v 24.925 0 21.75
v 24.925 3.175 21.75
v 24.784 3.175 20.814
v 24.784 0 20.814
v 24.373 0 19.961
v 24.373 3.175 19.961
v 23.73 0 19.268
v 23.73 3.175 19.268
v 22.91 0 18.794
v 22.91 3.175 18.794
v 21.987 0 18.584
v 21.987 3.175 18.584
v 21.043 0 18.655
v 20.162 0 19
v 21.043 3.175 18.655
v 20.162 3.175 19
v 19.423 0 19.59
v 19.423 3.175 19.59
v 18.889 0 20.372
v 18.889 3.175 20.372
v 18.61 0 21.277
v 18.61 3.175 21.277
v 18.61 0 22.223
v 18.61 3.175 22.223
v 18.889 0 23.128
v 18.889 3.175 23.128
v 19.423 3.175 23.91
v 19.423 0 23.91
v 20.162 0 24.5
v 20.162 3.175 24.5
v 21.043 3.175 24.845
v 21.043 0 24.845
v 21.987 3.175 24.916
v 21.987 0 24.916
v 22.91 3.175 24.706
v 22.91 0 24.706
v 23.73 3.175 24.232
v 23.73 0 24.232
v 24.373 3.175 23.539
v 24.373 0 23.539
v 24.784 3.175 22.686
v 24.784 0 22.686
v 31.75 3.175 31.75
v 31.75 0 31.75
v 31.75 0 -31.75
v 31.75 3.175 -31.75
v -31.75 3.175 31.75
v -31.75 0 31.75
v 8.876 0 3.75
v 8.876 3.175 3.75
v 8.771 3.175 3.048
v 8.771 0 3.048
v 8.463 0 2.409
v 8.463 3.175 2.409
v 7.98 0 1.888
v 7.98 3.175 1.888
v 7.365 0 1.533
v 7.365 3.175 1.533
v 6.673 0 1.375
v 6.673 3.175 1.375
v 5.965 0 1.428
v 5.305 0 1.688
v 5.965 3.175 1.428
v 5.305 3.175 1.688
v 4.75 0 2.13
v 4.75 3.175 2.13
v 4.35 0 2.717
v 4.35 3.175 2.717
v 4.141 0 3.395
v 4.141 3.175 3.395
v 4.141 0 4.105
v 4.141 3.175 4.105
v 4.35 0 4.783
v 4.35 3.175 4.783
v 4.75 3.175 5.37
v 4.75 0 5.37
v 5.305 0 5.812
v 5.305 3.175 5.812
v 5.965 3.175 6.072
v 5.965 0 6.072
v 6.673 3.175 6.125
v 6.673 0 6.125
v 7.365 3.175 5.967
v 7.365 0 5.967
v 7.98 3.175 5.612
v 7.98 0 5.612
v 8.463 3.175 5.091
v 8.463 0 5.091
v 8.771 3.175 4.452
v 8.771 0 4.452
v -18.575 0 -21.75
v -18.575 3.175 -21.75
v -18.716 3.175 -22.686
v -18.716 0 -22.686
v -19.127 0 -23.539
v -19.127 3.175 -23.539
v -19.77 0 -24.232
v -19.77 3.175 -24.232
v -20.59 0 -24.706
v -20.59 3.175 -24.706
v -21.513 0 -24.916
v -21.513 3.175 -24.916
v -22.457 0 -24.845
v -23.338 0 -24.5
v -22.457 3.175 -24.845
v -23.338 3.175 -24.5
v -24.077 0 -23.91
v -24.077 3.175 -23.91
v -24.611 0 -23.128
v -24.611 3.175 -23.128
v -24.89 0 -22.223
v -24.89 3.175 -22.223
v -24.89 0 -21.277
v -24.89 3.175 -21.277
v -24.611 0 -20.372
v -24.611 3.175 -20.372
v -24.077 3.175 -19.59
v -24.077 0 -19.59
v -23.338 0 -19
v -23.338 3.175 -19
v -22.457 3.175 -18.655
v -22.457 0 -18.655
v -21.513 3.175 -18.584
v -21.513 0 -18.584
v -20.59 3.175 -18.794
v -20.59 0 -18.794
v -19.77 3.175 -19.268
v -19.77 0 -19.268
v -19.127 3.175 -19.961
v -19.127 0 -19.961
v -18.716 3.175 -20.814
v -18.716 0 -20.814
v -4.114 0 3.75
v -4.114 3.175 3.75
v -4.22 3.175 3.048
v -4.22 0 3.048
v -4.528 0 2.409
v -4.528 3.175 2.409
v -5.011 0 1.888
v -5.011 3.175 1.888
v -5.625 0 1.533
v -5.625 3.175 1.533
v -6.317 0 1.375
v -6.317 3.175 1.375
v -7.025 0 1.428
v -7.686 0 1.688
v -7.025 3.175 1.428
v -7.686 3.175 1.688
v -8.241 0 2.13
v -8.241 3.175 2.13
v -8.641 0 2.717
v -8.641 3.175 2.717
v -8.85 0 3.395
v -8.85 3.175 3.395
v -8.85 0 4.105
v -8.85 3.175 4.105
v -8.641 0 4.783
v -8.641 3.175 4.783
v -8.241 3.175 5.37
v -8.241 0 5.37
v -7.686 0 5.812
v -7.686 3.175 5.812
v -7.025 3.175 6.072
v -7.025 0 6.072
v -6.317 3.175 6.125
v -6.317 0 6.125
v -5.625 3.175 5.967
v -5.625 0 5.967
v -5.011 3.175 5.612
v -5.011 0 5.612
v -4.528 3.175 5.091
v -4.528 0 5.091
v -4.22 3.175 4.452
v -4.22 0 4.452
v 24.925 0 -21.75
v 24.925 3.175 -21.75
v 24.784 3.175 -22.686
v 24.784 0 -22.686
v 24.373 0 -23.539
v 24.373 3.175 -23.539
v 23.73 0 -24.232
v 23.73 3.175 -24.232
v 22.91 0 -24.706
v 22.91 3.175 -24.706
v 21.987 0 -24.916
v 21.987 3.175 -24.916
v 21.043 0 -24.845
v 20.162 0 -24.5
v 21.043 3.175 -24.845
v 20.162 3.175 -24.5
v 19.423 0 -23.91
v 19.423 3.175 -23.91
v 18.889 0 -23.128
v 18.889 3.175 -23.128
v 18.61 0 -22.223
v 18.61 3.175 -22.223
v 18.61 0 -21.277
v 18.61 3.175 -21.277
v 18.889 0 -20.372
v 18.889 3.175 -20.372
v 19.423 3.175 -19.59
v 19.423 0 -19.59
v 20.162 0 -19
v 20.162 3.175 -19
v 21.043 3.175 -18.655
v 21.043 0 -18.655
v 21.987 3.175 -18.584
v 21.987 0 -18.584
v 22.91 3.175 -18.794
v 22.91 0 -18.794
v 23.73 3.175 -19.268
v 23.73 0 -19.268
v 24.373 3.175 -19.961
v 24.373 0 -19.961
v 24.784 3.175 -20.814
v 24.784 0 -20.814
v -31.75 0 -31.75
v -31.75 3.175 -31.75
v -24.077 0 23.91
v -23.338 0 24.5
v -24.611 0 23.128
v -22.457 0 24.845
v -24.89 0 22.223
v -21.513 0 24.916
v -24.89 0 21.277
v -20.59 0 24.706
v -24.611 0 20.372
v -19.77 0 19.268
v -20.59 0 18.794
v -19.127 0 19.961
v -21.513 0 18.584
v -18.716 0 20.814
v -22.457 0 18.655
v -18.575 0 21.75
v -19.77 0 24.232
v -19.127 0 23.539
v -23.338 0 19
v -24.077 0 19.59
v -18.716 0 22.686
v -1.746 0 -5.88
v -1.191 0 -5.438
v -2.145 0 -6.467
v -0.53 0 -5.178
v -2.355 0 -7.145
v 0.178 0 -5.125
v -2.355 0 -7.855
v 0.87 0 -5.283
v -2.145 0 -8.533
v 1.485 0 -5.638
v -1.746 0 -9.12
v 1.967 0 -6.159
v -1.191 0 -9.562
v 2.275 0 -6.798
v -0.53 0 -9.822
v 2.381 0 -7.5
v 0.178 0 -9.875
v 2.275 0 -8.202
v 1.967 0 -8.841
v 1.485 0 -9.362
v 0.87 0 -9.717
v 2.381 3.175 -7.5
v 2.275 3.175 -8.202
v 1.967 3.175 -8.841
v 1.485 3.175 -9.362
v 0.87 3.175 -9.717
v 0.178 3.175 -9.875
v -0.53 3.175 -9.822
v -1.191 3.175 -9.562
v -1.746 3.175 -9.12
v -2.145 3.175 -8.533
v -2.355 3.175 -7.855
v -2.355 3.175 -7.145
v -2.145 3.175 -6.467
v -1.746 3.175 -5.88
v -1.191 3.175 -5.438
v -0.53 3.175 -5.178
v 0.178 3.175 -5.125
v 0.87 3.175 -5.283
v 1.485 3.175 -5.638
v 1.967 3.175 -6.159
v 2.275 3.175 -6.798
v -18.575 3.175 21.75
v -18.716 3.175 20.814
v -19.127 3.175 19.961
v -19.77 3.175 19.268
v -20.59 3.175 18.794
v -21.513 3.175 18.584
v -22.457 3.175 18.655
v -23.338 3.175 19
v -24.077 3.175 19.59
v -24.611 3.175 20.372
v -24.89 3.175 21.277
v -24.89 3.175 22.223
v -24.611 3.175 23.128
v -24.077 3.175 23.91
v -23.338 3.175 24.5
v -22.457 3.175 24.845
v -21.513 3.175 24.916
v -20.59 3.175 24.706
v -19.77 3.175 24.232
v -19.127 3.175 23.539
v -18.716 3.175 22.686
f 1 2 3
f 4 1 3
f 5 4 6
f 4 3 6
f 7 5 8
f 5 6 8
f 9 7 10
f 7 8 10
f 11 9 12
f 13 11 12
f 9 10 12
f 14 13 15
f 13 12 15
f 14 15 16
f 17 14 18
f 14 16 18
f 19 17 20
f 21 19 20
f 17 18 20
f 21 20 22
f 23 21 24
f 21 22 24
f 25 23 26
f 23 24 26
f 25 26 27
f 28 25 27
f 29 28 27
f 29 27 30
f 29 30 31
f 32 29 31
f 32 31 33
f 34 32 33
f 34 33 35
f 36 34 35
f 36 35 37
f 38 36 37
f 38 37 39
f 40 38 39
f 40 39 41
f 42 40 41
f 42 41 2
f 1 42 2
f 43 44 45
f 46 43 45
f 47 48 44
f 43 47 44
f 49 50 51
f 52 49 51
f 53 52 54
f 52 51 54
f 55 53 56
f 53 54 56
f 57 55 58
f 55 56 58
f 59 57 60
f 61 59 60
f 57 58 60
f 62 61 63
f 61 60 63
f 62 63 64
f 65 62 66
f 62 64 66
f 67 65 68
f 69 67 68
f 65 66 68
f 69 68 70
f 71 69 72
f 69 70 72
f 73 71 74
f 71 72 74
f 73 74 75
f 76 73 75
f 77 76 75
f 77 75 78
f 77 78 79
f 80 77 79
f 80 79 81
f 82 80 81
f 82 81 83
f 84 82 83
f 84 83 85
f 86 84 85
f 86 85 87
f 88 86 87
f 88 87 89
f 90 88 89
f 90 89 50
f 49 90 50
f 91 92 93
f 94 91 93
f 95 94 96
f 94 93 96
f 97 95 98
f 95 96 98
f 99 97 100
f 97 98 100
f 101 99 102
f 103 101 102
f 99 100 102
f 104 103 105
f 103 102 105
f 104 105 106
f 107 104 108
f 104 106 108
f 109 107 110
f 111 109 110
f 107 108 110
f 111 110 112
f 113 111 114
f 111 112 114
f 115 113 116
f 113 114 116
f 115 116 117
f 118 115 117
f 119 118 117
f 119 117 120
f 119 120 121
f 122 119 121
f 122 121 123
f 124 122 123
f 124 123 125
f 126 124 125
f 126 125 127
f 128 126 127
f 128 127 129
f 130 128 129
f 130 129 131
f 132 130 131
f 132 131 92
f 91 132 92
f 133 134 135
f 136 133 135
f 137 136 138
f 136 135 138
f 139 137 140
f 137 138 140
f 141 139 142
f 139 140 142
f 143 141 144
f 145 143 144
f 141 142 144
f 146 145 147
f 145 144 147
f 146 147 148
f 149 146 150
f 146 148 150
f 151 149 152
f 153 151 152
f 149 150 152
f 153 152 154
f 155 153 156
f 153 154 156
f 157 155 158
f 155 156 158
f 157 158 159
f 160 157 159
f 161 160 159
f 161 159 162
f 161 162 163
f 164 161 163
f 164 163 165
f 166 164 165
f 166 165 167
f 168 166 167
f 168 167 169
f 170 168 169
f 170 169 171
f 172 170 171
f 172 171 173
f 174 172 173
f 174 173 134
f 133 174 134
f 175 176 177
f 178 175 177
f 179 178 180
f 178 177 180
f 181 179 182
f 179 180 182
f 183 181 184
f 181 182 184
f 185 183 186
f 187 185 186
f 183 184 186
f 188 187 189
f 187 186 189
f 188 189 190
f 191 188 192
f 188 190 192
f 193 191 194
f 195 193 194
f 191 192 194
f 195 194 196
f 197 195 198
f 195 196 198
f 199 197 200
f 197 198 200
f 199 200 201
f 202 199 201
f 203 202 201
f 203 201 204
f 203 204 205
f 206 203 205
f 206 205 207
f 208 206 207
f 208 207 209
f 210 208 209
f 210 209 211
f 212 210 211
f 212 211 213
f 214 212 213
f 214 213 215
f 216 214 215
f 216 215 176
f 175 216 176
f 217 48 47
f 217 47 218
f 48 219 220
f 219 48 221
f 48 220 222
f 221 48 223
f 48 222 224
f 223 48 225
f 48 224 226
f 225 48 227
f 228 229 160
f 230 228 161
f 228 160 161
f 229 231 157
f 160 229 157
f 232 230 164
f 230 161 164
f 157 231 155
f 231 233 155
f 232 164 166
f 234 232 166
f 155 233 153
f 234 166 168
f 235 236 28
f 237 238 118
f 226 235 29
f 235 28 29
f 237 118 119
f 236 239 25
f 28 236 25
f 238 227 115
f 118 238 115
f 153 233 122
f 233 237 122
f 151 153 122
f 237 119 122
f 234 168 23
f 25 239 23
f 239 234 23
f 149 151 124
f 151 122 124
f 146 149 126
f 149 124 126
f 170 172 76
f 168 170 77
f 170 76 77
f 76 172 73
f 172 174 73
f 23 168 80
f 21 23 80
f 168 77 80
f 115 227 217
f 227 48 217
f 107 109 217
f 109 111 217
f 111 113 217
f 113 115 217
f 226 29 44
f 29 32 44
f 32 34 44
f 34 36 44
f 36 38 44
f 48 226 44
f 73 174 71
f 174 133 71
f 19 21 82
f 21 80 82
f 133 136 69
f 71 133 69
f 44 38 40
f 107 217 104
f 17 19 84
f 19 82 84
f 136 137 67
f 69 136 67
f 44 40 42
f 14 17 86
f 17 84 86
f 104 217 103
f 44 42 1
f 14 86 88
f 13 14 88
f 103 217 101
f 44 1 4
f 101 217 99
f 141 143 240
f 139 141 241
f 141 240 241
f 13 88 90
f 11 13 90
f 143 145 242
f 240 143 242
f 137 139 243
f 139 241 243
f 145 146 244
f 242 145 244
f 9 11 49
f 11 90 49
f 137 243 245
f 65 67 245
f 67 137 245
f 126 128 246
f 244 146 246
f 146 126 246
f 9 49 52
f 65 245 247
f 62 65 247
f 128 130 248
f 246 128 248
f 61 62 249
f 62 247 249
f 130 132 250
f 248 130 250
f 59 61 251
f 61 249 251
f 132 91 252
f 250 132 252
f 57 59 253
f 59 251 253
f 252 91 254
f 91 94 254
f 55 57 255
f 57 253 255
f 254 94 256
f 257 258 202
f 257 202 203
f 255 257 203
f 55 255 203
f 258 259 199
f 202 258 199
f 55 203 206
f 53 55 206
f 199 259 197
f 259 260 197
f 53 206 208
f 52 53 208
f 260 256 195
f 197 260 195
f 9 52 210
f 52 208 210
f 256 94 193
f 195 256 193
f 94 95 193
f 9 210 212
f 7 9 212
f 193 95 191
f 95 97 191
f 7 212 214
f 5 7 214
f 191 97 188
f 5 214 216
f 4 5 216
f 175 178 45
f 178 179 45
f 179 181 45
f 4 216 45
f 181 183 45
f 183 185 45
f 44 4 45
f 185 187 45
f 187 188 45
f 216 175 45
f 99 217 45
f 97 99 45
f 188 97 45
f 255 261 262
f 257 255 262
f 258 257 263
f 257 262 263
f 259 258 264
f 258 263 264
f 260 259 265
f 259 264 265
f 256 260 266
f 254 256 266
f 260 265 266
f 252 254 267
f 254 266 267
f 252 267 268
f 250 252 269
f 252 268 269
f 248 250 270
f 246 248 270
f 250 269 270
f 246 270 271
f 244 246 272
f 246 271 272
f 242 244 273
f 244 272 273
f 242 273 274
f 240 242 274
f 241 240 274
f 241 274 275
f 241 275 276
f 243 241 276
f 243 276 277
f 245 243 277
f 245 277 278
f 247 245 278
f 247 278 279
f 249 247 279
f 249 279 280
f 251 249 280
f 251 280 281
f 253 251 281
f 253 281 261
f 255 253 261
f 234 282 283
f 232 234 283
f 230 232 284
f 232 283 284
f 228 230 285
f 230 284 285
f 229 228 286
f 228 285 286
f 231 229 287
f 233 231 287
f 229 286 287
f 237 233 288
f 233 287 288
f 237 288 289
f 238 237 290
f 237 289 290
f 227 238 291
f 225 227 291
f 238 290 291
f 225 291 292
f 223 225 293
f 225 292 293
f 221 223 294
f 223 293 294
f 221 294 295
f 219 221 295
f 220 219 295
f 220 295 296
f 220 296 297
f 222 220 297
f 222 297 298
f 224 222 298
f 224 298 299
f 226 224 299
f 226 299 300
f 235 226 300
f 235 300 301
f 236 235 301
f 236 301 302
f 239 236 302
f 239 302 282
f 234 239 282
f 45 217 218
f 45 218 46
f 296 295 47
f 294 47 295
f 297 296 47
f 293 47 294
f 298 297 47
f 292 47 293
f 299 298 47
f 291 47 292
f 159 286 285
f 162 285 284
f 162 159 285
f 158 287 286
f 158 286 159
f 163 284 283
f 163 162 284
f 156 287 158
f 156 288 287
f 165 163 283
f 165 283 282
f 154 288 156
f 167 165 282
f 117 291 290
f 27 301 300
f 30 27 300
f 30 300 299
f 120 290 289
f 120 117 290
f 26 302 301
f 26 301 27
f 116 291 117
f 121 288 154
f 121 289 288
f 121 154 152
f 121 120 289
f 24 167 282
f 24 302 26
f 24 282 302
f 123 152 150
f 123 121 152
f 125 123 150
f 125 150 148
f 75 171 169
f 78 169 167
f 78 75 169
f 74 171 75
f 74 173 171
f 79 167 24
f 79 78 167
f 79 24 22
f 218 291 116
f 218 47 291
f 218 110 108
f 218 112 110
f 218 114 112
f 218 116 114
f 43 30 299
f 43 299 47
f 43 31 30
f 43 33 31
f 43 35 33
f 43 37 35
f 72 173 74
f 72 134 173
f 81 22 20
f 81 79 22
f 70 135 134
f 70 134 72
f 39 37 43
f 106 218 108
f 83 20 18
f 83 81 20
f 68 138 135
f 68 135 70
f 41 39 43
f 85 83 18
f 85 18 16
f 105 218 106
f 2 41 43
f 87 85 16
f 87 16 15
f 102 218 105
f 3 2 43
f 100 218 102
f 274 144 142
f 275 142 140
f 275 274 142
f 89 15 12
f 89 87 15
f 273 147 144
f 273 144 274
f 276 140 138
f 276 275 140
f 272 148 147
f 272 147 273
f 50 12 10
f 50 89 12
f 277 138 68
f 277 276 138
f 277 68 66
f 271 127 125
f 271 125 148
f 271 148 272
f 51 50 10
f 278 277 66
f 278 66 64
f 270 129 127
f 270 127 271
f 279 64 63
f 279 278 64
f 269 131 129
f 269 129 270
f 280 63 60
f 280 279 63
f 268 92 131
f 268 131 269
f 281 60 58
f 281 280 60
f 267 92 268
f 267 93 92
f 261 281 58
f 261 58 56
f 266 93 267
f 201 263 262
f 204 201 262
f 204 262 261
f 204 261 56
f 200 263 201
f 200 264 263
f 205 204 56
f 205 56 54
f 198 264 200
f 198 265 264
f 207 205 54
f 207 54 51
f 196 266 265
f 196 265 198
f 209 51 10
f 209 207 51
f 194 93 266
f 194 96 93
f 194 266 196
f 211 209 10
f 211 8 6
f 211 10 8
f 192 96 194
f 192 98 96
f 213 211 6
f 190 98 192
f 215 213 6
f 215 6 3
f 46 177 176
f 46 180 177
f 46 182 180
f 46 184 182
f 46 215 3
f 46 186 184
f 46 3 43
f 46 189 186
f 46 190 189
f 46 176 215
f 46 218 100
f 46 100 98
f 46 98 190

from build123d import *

# Parameters (mm, degrees)
SKETCH1_W           = 63.5
SKETCH1_H           = 63.5
BOSS_EXTRUDE1_DEPTH = 3.175
SKETCH2_R           = 2.38125
CUT_EXTRUDE1_DEPTH  = 4.175
SKETCH3_R           = 3.175
CUT_EXTRUDE2_DEPTH  = 4.175


with BuildPart() as part:
    # Sketch1 → Boss-Extrude1 (new body)
    with BuildSketch(Plane(origin=(0, 0, 0), x_dir=(1, 0, 0), z_dir=(0, 1, 0))):
        Rectangle(SKETCH1_W, SKETCH1_H)
    extrude(amount=BOSS_EXTRUDE1_DEPTH)

    # Sketch2 → Cut-Extrude1 (cut, through all)
    with BuildSketch(Plane(origin=(0, 3.175, 0), x_dir=(1, 0, 0), z_dir=(0, 1, 0))):
        with Locations((0, 7.5)):
            Circle(SKETCH2_R)
        with Locations((6.495190528, -3.75)):
            Circle(SKETCH2_R)
        with Locations((-6.495190528, -3.75)):
            Circle(SKETCH2_R)
    extrude(amount=-CUT_EXTRUDE1_DEPTH, mode=Mode.SUBTRACT)

    # Sketch3 → Cut-Extrude2 (cut, through all)
    with BuildSketch(Plane(origin=(0, 3.175, 0), x_dir=(1, 0, 0), z_dir=(0, 1, 0))):
        with Locations((-21.75, 21.75)):
            Circle(SKETCH3_R)
        with Locations((-21.75, -21.75)):
            Circle(SKETCH3_R)
        with Locations((21.75, -21.75)):
            Circle(SKETCH3_R)
        with Locations((21.75, 21.75)):
            Circle(SKETCH3_R)
    extrude(amount=-CUT_EXTRUDE2_DEPTH, mode=Mode.SUBTRACT)


solid = part.part
